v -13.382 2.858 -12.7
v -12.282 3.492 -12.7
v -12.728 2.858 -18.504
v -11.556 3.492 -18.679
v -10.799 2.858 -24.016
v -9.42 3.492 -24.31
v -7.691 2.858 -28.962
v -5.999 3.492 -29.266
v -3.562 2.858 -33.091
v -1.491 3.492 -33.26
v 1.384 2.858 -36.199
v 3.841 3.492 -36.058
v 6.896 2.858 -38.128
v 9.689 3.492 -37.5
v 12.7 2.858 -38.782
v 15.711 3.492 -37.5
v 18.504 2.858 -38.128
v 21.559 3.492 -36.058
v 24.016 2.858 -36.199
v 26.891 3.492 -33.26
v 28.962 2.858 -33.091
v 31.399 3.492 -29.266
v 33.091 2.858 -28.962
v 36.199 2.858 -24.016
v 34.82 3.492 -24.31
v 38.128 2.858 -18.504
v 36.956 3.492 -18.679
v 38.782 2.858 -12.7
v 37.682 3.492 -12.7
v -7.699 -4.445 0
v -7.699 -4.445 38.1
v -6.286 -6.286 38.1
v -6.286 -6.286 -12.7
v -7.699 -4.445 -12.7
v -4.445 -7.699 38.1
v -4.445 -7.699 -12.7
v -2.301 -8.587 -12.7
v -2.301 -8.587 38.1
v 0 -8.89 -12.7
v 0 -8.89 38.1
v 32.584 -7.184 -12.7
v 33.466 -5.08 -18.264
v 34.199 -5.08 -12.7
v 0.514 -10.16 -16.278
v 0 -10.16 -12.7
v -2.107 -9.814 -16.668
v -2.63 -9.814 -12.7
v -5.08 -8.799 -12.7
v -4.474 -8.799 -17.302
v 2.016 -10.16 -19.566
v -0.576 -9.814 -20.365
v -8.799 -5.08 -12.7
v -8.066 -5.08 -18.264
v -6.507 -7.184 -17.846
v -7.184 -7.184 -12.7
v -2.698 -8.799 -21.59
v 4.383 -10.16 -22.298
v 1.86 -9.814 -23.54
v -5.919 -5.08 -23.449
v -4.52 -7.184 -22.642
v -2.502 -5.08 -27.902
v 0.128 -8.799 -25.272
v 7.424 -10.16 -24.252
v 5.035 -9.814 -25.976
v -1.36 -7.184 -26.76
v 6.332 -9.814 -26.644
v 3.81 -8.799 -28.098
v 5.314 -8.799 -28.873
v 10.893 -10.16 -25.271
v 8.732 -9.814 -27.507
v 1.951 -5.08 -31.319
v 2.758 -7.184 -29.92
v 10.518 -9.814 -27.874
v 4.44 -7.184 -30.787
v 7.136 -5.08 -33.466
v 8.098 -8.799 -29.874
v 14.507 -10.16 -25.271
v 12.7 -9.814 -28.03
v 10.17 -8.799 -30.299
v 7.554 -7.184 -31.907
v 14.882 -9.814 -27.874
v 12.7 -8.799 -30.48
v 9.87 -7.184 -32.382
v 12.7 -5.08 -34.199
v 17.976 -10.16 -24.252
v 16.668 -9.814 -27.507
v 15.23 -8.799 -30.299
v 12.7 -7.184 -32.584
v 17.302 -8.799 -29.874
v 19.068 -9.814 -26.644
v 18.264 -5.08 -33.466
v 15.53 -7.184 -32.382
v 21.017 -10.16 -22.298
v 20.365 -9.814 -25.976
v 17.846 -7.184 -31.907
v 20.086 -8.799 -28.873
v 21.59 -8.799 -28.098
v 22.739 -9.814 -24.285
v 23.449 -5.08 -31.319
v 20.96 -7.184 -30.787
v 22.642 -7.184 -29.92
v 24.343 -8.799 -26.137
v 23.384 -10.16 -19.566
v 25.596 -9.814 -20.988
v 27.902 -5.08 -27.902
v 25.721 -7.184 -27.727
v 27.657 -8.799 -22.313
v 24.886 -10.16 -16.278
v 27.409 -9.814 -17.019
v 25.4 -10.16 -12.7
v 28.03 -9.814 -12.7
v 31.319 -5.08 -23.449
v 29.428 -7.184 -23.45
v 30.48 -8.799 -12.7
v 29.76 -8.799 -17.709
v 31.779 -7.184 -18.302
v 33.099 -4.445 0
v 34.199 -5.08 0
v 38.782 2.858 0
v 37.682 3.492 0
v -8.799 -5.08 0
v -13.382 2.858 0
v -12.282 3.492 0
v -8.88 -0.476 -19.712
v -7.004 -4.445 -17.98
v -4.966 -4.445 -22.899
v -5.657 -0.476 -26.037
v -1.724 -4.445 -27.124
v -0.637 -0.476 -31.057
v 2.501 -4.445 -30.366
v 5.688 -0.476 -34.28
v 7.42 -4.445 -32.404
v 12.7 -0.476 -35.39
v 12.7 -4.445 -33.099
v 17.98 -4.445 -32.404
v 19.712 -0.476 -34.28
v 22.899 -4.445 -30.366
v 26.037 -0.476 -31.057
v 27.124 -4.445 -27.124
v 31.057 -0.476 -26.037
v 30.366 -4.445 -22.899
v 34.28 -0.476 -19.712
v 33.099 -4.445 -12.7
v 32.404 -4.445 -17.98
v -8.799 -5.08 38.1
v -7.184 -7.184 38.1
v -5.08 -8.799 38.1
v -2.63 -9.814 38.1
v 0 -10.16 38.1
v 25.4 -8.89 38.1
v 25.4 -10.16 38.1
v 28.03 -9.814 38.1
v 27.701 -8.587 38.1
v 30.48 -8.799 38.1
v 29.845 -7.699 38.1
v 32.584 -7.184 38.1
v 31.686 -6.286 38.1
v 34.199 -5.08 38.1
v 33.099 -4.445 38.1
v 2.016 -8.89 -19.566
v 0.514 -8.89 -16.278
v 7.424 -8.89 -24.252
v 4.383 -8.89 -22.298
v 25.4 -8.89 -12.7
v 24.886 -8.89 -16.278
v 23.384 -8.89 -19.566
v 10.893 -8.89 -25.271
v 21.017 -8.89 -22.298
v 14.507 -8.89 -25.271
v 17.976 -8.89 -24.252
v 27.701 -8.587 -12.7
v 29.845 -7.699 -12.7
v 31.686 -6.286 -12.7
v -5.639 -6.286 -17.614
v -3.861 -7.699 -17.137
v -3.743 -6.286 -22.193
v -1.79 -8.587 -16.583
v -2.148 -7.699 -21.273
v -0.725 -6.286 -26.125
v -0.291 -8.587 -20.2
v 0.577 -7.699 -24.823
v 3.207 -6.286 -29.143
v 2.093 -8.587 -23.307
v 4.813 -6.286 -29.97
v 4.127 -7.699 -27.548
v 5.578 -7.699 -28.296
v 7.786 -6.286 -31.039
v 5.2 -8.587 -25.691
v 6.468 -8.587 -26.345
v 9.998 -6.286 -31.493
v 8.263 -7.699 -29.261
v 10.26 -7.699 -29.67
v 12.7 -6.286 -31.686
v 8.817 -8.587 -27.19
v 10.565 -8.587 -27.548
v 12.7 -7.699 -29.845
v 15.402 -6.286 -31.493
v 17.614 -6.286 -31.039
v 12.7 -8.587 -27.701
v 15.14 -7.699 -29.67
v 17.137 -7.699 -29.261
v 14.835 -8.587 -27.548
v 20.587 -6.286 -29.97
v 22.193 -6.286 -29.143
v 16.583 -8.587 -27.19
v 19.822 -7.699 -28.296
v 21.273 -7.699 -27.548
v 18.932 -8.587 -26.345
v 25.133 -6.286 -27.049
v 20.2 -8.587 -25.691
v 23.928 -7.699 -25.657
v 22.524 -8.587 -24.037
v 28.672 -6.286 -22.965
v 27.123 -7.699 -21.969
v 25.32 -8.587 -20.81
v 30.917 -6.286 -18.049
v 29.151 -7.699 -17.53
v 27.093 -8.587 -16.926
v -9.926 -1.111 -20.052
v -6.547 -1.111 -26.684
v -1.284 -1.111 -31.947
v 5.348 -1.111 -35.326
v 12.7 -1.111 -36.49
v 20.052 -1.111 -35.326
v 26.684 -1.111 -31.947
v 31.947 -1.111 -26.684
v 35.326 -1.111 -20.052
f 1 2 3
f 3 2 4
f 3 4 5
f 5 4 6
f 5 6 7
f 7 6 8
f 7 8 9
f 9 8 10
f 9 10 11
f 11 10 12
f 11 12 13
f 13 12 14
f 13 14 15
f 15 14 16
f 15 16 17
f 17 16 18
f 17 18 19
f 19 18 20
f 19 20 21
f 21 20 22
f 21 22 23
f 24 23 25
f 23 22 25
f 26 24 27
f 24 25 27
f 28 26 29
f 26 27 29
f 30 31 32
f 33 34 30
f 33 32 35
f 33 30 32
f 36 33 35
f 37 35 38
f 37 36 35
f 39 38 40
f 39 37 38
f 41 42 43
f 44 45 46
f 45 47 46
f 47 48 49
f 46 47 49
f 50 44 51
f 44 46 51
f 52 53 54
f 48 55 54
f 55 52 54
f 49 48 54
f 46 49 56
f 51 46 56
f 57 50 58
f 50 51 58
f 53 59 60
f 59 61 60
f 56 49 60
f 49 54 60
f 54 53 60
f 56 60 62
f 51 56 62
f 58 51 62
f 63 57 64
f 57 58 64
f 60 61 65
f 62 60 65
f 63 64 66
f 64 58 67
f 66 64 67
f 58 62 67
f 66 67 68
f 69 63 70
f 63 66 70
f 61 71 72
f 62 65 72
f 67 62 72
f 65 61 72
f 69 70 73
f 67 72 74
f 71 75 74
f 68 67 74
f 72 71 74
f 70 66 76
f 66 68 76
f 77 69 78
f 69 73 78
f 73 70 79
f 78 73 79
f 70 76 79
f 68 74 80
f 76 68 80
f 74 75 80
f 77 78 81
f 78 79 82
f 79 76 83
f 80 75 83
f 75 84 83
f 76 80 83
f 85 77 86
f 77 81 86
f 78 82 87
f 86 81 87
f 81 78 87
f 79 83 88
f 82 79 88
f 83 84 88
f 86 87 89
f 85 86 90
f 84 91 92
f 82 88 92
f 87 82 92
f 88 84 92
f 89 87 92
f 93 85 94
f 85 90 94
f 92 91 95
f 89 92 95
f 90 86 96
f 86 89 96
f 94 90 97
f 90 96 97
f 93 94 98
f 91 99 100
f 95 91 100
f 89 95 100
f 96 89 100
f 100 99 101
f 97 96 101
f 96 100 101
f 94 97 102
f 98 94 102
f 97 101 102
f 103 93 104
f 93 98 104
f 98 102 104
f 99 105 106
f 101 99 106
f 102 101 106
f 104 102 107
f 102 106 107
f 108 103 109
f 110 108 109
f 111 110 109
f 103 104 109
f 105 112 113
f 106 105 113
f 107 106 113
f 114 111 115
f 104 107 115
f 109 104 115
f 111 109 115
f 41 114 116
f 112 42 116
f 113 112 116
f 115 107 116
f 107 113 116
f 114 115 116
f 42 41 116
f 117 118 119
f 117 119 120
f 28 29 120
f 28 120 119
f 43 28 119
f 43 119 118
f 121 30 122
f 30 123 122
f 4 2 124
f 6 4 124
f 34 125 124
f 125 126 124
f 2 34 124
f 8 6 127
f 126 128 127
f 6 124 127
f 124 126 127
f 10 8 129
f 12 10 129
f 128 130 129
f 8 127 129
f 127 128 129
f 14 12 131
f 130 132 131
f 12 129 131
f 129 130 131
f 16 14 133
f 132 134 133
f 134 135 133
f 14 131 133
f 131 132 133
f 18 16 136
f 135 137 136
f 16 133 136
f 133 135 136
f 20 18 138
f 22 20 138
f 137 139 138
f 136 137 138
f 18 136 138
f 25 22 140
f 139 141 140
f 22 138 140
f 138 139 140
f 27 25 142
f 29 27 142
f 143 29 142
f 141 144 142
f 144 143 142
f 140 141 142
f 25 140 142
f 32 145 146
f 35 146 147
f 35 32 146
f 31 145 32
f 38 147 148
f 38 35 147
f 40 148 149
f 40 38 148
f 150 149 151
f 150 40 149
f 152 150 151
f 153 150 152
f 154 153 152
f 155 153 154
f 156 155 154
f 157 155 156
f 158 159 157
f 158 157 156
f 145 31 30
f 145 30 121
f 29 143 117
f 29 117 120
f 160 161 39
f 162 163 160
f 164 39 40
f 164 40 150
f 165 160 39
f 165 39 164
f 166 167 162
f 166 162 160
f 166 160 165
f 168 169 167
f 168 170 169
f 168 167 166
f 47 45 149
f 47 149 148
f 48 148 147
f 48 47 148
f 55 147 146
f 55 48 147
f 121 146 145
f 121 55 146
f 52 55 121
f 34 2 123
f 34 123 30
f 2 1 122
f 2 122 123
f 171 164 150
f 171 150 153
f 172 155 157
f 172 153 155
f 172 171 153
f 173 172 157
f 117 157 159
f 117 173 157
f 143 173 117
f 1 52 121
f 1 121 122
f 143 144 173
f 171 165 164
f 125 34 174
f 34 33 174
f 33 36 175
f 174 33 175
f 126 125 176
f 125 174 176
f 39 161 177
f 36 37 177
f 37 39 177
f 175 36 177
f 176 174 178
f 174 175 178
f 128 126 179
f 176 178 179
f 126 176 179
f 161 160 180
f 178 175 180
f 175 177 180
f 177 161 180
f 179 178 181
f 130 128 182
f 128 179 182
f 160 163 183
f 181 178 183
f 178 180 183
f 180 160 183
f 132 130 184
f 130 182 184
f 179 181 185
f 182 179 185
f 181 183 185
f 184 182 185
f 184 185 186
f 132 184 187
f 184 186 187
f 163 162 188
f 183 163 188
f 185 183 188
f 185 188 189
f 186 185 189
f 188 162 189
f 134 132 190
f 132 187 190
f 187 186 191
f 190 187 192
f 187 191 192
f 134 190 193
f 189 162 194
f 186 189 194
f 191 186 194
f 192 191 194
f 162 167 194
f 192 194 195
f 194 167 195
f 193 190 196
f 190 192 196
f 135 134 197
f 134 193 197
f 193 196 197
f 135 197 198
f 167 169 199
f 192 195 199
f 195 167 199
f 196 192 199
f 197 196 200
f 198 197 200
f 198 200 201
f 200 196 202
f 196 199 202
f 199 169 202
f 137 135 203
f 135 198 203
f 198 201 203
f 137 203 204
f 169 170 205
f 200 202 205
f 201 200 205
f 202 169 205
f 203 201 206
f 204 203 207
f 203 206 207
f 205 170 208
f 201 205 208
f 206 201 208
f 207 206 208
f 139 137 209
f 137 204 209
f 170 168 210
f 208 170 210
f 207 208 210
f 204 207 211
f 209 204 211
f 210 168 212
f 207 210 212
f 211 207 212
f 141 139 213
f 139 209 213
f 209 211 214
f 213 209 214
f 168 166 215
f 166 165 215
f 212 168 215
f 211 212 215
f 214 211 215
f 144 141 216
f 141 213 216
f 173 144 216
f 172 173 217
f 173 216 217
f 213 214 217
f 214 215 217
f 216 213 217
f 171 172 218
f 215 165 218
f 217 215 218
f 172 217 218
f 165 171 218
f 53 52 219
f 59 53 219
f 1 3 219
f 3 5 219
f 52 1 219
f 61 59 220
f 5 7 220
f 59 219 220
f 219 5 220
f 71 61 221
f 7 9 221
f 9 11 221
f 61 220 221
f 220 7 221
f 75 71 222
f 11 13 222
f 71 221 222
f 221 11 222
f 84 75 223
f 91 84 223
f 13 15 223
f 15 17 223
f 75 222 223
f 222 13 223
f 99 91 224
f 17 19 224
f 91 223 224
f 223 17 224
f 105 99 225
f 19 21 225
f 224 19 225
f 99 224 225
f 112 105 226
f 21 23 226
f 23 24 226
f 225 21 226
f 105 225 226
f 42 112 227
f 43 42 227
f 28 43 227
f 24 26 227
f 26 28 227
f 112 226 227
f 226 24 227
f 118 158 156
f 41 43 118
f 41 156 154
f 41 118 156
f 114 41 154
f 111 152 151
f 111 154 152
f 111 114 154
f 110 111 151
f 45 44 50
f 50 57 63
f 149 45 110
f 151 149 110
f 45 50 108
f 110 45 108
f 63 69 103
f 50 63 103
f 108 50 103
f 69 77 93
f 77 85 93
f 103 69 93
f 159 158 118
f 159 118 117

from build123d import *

# Parameters (mm, degrees)
EXTRUDE_THIN1_DEPTH = 38.1
EXTRUDE_THIN2_START = 12.7
EXTRUDE_THIN2_DEPTH = 12.7
REVOLVE_THIN1_ANGLE = 180
EXTRUDE_THIN3_START = -10.16
EXTRUDE_THIN3_DEPTH = 1.27


# Read off the part's stored shape, not the designer's step: Extrude-Thin3
with BuildPart() as part:
    # Sketch1 → Extrude-Thin1 (new body)
    with BuildSketch(Plane.XY):
        with BuildLine():
            ThreePointArc((-8.798818102, -5.08), (-5.08, -8.798818102), (0, -10.16))
            Line((0, -10.16), (25.4, -10.16))
            ThreePointArc((25.4, -10.16), (30.48, -8.798818102), (34.198818102, -5.08))
            Line((34.198818102, -5.08), (33.09896584, -4.445))
            ThreePointArc((33.09896584, -4.445), (29.845, -7.69896584), (25.4, -8.89))
            Line((25.4, -8.89), (0, -8.89))
            ThreePointArc((0, -8.89), (-4.445, -7.69896584), (-7.69896584, -4.445))
            Line((-7.69896584, -4.445), (-8.798818102, -5.08))
        make_face()
    extrude(amount=EXTRUDE_THIN1_DEPTH)

    # Sketch2 → Extrude-Thin2 (add)
    with BuildSketch(Plane(origin=(0, 0, 0), x_dir=(-1, 0, 0), z_dir=(0, 0, -1)).offset(EXTRUDE_THIN2_START)):
        with BuildLine():
            Line((-38.781535864, 2.8575), (-34.198818102, -5.08))
            ThreePointArc((-34.198818102, -5.08), (-30.48, -8.798818102), (-25.4, -10.16))
            Line((-25.4, -10.16), (0, -10.16))
            ThreePointArc((0, -10.16), (5.08, -8.798818102), (8.798818102, -5.08))
            Line((8.798818102, -5.08), (13.381535864, 2.8575))
            Line((13.381535864, 2.8575), (12.281683601, 3.4925))
            Line((12.281683601, 3.4925), (7.69896584, -4.445))
            ThreePointArc((7.69896584, -4.445), (4.445, -7.69896584), (0, -8.89))
            Line((0, -8.89), (-25.4, -8.89))
            ThreePointArc((-25.4, -8.89), (-29.845, -7.69896584), (-33.09896584, -4.445))
            Line((-33.09896584, -4.445), (-37.681683601, 3.4925))
            Line((-37.681683601, 3.4925), (-38.781535864, 2.8575))
        make_face()
    extrude(amount=-EXTRUDE_THIN2_DEPTH)

    # Sketch3 → Revolve-Thin1 (revolve)
    with BuildSketch(Plane(origin=(0, 0, -12.7), x_dir=(-1, 0, 0), z_dir=(0, 0, -1))):
        with BuildLine():
            ThreePointArc((0, -10.16), (5.08, -8.798818102), (8.798818102, -5.08))
            Line((8.798818102, -5.08), (13.381535864, 2.8575))
            Line((13.381535864, 2.8575), (12.281683601, 3.4925))
            Line((12.281683601, 3.4925), (7.69896584, -4.445))
            ThreePointArc((7.69896584, -4.445), (4.445, -7.69896584), (0, -8.89))
            Line((0, -8.89), (0, -10.16))
        make_face()
    revolve(axis=Axis((12.7, -10.16, -12.7), (0, -1, 0)), revolution_arc=REVOLVE_THIN1_ANGLE)

    # Extrude-Thin3 outline → Extrude-Thin3 (add)
    with BuildSketch(Plane(origin=(0, 0, 0), x_dir=(1, 0, 0), z_dir=(0, 1, 0)).offset(EXTRUDE_THIN3_START)):
        with BuildLine():
            Line((0, 12.7), (25.4, 12.7))
            ThreePointArc((25.4, 12.7), (12.7, 25.4), (0, 12.7))
        make_face()
    extrude(amount=EXTRUDE_THIN3_DEPTH)


solid = part.part
